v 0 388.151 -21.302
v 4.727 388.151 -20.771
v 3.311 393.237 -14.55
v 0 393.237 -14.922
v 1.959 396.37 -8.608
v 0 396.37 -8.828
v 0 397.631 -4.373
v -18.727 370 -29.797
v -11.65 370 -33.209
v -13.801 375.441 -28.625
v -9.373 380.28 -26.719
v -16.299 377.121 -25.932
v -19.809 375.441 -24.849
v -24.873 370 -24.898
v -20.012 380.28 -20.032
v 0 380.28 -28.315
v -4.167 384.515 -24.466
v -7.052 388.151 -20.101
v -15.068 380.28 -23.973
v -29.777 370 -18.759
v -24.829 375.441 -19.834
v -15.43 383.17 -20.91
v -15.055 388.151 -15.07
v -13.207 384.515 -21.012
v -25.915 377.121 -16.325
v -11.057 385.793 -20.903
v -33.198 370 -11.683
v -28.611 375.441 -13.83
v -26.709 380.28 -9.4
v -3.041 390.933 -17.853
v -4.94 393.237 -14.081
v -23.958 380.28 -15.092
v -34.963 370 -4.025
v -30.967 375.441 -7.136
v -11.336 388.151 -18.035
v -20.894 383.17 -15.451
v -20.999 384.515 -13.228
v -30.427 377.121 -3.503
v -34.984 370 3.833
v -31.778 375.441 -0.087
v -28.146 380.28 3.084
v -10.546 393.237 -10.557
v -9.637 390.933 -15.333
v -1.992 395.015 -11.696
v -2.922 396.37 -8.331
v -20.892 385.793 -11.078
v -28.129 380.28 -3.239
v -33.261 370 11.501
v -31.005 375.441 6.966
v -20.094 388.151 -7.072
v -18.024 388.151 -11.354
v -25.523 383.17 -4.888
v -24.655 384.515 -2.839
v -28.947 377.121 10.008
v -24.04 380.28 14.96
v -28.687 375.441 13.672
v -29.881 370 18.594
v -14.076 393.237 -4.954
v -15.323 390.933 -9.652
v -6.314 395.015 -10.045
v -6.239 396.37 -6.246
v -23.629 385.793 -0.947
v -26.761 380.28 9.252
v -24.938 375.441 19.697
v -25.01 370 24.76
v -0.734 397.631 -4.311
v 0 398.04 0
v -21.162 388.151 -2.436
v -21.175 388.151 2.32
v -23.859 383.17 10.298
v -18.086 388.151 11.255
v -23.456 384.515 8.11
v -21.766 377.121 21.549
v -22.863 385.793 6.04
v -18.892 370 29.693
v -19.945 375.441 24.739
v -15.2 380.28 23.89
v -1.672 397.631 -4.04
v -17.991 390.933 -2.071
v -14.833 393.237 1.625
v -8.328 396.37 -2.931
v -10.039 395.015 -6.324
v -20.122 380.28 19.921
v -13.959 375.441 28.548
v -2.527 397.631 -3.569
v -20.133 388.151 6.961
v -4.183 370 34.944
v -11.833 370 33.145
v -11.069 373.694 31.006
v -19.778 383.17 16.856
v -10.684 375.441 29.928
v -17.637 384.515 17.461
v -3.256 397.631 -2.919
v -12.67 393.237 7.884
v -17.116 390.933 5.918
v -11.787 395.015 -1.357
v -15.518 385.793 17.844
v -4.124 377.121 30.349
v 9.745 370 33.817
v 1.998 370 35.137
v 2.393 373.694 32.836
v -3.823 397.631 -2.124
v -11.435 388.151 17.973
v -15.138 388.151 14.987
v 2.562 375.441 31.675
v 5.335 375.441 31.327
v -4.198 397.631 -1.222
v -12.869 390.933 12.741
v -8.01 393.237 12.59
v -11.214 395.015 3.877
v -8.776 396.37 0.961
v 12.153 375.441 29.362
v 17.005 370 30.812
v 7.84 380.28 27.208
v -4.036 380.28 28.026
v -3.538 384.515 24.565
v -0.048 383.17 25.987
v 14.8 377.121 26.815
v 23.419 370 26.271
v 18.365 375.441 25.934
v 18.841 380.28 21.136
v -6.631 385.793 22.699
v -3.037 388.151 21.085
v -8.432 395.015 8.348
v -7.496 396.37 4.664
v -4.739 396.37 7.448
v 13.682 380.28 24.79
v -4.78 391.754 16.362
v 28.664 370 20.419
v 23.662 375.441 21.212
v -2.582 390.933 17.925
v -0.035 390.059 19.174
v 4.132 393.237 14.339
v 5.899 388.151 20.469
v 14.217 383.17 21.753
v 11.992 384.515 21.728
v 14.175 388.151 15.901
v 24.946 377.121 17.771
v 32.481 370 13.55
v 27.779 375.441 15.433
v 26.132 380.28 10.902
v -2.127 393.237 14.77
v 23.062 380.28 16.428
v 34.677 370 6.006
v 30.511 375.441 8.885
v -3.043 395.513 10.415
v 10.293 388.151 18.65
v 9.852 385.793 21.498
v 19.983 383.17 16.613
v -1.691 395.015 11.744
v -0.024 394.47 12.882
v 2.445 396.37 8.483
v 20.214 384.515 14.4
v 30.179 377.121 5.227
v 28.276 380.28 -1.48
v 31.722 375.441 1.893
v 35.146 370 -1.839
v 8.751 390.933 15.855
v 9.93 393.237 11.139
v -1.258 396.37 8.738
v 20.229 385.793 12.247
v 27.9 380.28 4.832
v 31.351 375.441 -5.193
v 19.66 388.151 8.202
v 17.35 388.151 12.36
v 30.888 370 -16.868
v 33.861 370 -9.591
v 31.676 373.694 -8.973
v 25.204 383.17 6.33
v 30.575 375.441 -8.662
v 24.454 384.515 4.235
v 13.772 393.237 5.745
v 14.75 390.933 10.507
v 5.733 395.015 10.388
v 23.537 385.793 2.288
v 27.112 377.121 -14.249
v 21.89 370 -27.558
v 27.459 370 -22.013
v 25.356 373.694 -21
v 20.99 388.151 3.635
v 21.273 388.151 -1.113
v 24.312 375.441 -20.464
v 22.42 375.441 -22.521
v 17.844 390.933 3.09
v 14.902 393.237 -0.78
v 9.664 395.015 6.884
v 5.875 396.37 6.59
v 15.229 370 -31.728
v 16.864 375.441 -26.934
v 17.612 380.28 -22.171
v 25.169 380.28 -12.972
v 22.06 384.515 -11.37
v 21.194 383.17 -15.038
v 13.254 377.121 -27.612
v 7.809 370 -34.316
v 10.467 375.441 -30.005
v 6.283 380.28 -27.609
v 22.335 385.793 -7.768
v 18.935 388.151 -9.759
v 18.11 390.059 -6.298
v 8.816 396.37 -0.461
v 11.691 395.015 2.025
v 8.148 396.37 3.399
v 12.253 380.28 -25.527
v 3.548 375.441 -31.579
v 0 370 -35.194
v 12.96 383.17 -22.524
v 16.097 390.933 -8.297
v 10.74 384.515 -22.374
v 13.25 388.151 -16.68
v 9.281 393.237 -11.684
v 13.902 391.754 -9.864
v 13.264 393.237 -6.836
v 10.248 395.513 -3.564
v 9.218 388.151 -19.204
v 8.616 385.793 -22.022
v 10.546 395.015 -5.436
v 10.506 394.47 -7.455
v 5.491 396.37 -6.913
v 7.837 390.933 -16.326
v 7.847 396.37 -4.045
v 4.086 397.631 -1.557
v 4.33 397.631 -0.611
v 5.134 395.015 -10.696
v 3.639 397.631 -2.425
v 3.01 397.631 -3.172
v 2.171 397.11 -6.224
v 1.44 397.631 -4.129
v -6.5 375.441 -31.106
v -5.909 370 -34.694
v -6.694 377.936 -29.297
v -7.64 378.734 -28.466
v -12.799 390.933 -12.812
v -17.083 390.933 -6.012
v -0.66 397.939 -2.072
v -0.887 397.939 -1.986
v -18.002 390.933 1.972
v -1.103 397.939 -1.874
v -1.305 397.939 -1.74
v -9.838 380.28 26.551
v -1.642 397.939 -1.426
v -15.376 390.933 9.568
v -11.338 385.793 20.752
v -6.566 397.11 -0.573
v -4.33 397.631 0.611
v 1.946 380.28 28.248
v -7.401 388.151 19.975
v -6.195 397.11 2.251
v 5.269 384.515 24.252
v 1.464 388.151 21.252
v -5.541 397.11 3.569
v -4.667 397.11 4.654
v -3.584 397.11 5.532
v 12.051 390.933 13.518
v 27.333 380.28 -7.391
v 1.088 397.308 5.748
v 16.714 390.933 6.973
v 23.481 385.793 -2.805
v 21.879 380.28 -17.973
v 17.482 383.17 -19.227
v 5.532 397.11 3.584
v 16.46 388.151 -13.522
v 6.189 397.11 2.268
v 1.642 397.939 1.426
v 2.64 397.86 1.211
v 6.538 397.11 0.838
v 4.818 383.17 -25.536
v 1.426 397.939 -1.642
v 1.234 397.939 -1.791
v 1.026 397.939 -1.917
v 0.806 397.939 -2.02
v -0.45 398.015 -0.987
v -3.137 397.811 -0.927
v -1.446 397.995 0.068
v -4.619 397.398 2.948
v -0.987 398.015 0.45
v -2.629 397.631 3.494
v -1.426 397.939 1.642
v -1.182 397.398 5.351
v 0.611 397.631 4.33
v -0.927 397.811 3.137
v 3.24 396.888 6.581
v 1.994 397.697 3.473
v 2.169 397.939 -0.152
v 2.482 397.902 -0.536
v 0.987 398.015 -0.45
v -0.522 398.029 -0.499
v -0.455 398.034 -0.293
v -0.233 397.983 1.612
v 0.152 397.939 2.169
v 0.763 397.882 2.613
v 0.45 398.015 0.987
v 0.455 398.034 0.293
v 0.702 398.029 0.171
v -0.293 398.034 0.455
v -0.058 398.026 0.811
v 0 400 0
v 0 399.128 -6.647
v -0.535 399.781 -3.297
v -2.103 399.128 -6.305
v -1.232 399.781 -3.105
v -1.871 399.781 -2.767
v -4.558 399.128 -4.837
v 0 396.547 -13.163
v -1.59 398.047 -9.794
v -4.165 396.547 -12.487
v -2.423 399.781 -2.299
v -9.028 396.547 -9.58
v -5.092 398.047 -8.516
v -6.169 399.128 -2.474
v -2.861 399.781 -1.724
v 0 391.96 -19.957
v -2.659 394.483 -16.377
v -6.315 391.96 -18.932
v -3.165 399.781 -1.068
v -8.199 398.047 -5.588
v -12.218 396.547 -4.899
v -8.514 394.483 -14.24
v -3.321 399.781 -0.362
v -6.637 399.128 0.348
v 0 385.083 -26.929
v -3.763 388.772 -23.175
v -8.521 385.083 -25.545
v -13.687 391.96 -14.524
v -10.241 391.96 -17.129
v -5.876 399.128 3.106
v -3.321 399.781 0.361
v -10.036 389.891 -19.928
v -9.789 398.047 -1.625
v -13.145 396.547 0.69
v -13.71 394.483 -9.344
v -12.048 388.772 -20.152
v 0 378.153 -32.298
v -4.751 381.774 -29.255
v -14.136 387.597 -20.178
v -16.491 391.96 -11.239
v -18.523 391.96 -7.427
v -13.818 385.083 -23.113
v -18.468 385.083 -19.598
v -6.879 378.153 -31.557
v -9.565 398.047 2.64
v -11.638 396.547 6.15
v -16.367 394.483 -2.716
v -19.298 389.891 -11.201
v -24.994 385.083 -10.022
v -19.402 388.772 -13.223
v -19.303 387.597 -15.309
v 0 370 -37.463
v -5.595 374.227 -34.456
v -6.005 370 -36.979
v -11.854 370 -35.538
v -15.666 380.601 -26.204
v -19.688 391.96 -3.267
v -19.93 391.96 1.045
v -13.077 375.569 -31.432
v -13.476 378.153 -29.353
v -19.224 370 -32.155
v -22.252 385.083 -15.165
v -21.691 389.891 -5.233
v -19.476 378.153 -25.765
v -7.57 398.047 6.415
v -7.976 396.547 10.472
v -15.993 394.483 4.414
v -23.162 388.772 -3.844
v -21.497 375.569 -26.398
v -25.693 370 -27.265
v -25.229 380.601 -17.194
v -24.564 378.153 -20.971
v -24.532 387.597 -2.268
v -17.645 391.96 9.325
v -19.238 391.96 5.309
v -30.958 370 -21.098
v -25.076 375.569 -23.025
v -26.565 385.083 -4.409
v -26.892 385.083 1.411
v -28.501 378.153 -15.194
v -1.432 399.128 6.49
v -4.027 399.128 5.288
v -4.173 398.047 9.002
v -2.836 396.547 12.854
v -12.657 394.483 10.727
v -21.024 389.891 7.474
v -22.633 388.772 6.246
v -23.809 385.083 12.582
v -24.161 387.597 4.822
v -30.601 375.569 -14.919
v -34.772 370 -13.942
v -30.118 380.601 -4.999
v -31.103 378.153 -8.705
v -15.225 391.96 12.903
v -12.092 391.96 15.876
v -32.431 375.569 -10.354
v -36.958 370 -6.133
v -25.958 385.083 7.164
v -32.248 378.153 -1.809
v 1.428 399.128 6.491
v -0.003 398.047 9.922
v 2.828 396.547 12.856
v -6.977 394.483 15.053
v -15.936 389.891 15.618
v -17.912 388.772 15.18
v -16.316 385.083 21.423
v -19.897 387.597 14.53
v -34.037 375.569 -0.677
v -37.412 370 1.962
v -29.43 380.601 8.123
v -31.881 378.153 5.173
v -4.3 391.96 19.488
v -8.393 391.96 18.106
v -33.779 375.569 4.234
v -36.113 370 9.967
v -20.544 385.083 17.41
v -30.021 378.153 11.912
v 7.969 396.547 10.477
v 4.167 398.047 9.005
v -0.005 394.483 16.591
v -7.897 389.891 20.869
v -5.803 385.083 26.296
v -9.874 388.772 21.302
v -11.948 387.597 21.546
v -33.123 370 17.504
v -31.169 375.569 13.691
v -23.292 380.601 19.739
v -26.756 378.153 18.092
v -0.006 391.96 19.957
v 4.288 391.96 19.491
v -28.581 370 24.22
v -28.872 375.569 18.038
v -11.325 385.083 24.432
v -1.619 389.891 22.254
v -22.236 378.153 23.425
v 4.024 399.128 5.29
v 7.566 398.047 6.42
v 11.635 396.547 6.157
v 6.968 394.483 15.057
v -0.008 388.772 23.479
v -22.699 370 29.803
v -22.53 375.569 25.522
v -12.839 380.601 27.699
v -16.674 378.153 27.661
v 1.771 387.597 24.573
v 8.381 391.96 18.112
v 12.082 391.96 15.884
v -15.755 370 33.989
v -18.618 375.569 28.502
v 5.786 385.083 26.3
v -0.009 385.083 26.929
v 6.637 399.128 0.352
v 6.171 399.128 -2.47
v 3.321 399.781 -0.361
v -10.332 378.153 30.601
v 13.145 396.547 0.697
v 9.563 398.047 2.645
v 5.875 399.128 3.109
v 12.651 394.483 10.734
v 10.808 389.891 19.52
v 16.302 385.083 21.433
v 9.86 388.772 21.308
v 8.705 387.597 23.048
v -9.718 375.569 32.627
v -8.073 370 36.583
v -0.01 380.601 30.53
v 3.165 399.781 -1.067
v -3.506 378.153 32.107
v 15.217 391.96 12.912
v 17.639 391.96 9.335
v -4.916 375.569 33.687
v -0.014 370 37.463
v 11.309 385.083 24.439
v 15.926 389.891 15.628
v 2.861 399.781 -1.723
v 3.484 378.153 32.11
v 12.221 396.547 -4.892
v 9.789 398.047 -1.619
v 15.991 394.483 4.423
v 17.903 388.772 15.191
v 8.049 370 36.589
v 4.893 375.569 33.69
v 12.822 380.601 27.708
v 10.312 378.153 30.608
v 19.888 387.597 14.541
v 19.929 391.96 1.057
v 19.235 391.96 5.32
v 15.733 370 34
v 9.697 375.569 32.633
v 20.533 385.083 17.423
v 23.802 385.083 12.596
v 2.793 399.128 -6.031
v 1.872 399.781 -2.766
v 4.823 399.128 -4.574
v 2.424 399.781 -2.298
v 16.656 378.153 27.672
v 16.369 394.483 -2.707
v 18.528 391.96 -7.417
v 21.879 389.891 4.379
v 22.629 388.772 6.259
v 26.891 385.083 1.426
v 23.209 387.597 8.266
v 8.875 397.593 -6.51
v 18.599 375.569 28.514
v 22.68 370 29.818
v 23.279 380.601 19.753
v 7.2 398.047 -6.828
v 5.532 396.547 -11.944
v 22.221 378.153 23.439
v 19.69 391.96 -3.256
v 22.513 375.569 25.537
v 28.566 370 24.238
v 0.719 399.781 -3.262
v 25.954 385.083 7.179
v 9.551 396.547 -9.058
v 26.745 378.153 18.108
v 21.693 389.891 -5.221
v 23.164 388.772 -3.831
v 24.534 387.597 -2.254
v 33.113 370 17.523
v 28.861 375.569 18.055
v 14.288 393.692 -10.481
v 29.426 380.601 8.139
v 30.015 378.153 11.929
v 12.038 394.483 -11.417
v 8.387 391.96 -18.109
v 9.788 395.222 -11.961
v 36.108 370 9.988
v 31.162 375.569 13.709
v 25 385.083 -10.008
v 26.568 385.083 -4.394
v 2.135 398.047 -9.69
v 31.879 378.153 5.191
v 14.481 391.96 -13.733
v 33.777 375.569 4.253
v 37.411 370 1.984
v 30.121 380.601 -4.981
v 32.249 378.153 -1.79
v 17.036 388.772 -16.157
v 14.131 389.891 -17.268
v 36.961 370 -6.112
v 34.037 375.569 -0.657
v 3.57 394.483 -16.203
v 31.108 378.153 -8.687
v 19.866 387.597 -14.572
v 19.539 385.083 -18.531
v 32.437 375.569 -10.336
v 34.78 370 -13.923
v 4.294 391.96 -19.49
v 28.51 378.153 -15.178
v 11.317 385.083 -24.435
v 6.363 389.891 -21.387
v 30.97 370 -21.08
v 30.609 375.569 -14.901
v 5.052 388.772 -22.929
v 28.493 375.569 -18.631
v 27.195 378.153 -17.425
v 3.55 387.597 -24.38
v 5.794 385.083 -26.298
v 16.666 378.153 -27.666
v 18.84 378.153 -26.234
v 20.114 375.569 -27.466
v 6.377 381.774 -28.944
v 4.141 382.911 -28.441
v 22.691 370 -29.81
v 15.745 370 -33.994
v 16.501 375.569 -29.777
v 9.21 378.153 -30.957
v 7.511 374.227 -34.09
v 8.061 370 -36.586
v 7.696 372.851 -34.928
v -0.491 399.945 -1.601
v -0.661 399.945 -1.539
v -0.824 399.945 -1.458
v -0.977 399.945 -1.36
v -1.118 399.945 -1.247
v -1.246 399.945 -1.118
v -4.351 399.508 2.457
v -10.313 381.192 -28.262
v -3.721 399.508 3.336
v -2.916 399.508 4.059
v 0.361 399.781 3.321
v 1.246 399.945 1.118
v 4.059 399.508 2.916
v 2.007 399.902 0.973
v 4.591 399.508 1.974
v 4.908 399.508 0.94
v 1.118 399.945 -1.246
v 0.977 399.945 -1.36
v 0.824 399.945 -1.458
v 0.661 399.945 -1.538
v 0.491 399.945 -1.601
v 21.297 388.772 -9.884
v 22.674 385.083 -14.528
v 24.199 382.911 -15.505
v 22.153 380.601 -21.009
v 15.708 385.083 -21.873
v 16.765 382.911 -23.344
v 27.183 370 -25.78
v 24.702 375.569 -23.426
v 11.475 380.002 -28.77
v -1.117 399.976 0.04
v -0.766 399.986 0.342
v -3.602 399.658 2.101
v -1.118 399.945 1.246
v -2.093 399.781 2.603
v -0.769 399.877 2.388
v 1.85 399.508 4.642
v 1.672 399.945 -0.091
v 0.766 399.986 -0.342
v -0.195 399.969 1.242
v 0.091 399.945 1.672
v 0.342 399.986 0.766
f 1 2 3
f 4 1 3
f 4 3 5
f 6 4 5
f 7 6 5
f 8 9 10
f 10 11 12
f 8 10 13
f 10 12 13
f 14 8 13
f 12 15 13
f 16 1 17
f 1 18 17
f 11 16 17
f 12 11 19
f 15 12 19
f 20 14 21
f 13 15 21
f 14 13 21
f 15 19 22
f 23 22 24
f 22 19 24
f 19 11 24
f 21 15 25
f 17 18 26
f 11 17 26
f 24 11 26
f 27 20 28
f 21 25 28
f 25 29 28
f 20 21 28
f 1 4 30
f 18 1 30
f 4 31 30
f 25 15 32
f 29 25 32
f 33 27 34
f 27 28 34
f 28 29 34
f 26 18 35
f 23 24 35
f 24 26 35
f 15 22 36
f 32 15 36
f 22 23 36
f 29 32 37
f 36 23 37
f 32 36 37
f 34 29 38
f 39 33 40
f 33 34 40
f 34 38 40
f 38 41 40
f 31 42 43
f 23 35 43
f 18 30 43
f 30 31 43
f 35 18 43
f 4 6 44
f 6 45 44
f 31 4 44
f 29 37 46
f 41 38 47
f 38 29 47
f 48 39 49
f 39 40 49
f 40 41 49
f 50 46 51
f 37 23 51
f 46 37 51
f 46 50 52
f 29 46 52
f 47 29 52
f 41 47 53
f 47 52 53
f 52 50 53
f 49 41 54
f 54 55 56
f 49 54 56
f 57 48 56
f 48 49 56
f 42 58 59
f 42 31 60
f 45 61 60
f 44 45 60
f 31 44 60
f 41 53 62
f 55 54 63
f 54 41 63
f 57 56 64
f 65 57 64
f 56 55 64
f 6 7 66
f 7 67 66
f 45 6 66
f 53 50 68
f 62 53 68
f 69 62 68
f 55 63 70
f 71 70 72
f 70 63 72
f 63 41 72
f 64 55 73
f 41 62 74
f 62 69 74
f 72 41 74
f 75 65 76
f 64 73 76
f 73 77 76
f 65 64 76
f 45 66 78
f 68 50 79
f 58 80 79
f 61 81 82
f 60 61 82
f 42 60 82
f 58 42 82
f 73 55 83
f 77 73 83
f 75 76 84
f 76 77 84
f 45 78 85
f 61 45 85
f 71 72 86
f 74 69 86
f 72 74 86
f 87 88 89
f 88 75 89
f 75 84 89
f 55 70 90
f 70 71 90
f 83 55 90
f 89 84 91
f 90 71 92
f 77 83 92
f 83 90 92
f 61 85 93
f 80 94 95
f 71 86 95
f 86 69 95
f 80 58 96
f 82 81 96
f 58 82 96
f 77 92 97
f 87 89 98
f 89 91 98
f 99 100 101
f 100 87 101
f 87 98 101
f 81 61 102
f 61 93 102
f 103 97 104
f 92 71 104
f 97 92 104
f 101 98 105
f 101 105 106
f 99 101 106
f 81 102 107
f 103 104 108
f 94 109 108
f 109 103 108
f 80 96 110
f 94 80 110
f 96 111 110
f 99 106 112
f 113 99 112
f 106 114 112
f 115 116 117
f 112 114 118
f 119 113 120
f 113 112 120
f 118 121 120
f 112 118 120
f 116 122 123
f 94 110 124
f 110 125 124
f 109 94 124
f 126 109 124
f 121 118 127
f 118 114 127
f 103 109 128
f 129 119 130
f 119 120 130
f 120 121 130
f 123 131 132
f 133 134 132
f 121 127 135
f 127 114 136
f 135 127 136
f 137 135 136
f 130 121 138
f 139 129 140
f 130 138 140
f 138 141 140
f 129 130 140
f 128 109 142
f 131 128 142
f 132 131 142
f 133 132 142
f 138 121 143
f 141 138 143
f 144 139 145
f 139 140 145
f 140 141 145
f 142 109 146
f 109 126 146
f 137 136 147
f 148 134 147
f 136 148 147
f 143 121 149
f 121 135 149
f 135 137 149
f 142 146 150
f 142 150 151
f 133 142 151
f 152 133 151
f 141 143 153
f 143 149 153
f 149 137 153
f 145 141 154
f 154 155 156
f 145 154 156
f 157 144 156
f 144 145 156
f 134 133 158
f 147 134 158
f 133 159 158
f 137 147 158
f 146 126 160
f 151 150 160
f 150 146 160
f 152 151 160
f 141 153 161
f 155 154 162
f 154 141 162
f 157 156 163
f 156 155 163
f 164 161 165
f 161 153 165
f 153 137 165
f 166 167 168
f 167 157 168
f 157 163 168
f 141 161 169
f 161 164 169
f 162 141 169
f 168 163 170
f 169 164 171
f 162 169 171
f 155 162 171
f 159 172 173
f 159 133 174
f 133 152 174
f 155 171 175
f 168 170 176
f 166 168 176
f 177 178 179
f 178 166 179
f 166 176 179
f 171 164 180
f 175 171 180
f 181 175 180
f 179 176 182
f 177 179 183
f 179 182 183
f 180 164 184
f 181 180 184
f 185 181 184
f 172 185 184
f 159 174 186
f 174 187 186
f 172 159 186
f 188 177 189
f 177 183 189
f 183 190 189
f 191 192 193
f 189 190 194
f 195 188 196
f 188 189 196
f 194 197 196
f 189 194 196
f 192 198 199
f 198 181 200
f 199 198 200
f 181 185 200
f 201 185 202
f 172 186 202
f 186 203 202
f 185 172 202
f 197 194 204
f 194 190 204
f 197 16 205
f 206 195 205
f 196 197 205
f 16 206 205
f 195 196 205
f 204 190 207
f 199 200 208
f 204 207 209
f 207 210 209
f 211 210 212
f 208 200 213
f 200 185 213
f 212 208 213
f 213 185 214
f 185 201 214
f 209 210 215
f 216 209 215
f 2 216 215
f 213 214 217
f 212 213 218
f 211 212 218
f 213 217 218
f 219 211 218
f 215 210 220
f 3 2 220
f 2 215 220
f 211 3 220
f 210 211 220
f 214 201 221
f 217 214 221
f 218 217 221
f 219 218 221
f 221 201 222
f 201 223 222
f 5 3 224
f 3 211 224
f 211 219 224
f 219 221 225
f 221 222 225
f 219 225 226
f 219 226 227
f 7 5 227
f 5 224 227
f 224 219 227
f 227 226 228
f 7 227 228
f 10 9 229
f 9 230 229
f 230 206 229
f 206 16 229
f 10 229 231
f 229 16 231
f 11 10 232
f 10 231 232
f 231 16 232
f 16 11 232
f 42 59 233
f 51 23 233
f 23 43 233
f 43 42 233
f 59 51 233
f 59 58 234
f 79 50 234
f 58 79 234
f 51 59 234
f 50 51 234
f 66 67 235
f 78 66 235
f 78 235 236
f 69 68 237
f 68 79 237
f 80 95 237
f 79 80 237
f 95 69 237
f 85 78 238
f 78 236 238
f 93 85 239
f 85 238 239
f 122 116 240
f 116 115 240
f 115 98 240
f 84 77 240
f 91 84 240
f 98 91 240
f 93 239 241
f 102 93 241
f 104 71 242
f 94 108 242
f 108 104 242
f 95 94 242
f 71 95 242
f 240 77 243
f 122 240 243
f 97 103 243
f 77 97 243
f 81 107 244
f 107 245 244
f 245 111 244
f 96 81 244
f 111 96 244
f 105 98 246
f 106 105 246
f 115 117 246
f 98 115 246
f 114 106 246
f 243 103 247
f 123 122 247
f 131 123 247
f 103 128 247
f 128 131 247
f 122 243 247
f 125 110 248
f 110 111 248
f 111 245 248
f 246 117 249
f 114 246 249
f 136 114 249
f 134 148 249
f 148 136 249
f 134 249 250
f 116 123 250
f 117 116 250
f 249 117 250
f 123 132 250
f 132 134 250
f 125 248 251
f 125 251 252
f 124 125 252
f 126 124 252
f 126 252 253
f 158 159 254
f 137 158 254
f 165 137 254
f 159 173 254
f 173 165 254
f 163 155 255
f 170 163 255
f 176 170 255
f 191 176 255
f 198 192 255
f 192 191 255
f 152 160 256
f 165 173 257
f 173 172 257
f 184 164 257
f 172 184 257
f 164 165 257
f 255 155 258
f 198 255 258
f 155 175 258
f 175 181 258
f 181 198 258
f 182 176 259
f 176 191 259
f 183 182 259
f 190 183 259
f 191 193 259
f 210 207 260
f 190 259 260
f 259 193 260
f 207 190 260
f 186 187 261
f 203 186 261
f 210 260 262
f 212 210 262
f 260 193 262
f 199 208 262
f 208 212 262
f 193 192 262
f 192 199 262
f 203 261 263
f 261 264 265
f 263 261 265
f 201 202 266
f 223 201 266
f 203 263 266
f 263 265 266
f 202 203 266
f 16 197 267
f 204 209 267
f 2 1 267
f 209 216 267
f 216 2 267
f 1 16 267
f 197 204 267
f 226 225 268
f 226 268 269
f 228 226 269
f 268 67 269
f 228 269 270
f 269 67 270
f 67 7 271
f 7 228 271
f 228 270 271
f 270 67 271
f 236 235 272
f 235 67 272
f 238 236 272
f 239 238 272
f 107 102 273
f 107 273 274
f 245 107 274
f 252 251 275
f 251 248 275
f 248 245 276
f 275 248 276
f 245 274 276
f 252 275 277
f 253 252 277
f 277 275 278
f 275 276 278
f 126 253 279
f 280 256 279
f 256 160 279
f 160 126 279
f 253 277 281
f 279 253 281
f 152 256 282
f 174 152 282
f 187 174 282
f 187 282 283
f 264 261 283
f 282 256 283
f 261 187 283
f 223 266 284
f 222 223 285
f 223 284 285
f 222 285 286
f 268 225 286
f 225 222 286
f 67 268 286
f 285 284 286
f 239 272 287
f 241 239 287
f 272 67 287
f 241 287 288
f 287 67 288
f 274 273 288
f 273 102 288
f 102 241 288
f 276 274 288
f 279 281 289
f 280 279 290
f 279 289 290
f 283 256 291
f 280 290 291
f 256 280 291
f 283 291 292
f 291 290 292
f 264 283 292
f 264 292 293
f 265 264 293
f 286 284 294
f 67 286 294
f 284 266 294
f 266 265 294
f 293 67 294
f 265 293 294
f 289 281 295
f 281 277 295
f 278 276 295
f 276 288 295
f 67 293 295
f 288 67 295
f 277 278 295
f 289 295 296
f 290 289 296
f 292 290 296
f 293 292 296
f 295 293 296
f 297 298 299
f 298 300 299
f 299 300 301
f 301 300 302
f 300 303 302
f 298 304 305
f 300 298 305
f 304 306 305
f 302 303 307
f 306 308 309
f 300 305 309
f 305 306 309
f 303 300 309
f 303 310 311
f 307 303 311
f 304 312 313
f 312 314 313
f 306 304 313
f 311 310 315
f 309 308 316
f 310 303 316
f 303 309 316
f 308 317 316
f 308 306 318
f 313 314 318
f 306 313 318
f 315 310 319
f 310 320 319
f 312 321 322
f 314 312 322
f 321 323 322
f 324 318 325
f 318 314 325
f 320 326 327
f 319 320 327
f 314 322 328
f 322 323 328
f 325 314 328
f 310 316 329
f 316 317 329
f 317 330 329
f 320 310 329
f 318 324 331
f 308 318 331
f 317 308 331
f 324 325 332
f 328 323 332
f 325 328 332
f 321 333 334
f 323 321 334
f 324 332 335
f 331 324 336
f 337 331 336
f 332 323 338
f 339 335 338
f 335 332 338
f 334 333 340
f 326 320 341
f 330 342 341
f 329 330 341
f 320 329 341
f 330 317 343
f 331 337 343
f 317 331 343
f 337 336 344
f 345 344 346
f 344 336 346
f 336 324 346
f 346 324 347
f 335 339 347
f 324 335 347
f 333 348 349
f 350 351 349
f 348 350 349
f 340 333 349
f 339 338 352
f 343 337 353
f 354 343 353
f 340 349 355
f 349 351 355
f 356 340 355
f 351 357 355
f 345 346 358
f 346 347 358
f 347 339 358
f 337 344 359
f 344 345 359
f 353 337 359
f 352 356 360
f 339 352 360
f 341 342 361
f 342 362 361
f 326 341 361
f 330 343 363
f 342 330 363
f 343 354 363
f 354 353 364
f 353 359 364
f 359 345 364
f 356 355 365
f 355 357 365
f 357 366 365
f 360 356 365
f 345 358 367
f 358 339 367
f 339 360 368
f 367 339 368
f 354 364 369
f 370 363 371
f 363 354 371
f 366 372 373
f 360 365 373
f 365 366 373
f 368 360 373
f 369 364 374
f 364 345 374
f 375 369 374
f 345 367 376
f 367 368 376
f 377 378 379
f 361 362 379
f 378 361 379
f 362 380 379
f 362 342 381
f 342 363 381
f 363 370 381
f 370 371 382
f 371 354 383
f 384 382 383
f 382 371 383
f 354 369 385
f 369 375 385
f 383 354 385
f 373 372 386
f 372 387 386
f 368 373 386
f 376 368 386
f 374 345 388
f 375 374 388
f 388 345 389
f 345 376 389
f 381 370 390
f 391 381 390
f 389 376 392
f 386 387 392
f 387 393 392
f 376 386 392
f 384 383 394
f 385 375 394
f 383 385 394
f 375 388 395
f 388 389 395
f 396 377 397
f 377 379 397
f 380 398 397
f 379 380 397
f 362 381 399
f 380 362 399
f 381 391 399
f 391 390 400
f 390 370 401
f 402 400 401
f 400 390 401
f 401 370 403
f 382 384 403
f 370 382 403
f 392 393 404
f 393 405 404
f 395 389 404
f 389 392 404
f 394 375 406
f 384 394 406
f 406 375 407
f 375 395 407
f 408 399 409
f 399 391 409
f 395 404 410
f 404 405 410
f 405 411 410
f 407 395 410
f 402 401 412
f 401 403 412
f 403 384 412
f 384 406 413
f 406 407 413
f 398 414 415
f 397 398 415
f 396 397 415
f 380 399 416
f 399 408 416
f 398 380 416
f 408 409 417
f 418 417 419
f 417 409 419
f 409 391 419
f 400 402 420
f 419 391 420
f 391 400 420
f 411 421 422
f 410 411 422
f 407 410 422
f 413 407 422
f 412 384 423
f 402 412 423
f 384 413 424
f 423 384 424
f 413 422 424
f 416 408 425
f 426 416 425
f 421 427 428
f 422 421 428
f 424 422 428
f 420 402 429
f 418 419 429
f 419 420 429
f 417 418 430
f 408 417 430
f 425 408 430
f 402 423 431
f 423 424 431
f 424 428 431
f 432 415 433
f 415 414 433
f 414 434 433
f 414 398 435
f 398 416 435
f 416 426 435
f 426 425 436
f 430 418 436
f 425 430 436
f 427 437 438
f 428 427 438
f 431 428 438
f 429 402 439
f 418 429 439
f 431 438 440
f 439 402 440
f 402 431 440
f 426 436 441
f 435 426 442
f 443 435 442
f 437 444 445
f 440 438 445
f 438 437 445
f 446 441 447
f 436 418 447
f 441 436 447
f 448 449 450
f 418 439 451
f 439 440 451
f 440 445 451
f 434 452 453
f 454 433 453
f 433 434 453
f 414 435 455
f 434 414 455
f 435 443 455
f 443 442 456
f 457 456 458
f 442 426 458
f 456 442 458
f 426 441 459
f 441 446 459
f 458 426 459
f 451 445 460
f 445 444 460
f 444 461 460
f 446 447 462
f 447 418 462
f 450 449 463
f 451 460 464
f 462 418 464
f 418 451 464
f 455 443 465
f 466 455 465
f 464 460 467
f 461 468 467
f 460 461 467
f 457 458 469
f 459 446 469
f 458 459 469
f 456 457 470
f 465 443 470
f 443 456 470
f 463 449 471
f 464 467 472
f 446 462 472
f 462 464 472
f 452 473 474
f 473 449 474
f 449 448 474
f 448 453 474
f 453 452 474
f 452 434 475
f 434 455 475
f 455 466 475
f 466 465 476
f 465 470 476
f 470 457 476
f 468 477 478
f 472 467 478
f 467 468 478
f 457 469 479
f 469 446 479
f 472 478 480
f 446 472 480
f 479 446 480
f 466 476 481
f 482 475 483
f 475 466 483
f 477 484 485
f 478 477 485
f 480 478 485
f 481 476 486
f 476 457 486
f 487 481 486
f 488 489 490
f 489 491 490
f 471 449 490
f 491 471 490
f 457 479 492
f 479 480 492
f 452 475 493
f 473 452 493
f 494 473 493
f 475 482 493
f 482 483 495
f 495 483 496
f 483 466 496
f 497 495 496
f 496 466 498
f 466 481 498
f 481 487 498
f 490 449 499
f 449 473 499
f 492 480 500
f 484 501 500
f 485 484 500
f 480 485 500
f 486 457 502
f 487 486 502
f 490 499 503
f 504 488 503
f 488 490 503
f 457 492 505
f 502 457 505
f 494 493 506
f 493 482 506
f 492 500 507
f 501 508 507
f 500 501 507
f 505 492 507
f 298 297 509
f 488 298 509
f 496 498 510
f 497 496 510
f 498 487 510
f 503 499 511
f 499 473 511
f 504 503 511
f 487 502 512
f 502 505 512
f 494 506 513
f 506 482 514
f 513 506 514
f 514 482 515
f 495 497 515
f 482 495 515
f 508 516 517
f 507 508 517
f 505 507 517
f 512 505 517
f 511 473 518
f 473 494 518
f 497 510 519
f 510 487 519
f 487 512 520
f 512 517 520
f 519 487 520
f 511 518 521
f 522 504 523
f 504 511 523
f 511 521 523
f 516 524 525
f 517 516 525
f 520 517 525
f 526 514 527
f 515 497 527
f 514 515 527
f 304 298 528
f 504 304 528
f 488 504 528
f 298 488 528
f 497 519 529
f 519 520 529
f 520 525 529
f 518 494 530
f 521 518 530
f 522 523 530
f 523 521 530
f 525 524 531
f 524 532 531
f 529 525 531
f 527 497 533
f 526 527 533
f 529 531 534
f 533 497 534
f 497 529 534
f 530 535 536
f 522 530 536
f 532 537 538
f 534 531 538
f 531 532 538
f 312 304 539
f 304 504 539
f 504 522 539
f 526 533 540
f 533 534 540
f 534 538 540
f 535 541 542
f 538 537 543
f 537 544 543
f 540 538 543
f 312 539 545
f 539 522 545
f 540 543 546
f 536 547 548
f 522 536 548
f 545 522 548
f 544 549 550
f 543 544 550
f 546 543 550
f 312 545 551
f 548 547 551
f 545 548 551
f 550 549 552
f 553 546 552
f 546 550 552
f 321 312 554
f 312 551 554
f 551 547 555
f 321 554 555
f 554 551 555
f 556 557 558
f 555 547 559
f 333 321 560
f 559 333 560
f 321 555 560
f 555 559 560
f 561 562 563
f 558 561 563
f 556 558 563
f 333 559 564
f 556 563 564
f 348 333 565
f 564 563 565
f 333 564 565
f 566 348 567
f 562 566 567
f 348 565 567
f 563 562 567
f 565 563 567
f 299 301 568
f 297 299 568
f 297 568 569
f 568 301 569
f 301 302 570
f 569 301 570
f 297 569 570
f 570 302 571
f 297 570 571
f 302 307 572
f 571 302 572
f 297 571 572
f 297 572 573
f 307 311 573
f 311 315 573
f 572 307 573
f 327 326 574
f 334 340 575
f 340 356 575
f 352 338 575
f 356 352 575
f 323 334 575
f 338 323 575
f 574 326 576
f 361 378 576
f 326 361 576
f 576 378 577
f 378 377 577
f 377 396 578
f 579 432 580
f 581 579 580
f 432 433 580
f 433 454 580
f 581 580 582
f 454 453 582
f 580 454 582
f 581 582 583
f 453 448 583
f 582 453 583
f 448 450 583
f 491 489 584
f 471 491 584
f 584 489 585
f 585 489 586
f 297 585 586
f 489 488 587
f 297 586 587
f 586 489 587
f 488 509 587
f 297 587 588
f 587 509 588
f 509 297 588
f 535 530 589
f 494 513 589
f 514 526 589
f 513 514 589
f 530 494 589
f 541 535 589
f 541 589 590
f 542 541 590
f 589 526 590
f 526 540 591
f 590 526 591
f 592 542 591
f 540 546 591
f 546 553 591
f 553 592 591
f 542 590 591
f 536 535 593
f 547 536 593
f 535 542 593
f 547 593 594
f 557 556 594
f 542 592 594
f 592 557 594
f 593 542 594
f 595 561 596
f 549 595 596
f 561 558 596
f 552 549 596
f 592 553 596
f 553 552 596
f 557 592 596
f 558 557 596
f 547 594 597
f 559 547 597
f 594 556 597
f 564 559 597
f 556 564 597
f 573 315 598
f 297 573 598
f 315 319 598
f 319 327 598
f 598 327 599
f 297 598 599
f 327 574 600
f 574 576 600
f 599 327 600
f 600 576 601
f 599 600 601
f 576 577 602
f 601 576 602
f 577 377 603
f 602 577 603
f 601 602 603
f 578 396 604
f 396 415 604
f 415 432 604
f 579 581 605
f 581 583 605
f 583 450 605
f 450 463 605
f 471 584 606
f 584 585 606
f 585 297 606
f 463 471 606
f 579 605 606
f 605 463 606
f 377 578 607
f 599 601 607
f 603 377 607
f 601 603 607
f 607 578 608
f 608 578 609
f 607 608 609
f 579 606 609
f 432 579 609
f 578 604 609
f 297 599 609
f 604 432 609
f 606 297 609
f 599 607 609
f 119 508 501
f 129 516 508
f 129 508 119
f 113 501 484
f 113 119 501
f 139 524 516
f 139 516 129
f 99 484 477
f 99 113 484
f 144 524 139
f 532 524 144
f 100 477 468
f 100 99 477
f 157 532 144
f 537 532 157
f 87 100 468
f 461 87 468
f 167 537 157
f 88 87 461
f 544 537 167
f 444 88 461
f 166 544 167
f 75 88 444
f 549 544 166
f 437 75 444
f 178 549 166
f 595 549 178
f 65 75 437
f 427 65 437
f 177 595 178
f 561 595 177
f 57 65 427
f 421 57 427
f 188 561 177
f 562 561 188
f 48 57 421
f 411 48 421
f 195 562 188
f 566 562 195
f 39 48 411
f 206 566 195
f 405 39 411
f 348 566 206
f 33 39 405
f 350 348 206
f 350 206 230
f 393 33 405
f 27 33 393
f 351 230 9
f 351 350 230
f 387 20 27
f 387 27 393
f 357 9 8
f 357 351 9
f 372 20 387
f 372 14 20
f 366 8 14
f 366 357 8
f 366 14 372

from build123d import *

# Parameters (mm, degrees)
BOSS_EXTRUDE1_START = -304.8
SKETCH2_R           = 76.2
SKETCH2_R_2         = 74.2
BOSS_EXTRUDE1_DEPTH = 304.8
SKETCH3_R           = 134.747251172
CUT_EXTRUDE1_DEPTH  = 537.314284008


with BuildPart() as part:
    # Sketch1 → Revolve1 (revolve)
    with BuildSketch(Plane.XY, mode=Mode.PRIVATE) as revolve1_sk:
        with BuildLine():
            Line((76.2, 150), (76.2, 0))
            Line((76.2, 0), (78.16, 0))
            Line((78.16, 0), (78.16, 150))
            add(Edge.make_bspline(
                [(0, 400), (2.723149784, 400), (8.095363208, 399.131102803), (15.985209364, 395.313409978), (23.550682528, 389.130576689), (33.207143777, 377.875372886), (44.403572502, 358.368758892), (56.109342912, 327.087146412), (65.689764926, 289.080732548), (71.61438571, 252.993821619), (74.98797824, 222.299614595), (76.812690029, 198.58573428), (77.914396428, 174.415956203), (78.16, 158.124741441), (78.16, 150)],
                knots=[-1.570796327, -1.570796327, -1.570796327, -1.570796327, -1.472621556, -1.374446786, -1.276272016, -1.178097245, -0.981747704, -0.785398163, -0.589048623, -0.392699082, -0.294524311, -0.196349541, -0.09817477, 0, 0, 0, 0], degree=3))
            Line((0, 400), (0, 398.04))
            add(Edge.make_bspline(
                [(76.2, 150), (76.2, 398.04), (0, 398.04)],
                knots=[4.71238898, 4.71238898, 4.71238898, 6.283185307, 6.283185307, 6.283185307], degree=2, weights=[1, 0.707106781, 1]))
        make_face()
    revolve(revolve1_sk.sketch.rotate(Axis((0, 0, 0), (0, 1, 0)), 90), axis=Axis((0, 0, 0), (0, 1, 0)))

    # Sketch2 → Boss-Extrude1 (add)
    with BuildSketch(Plane(origin=(0, 150, 0), x_dir=(1, 0, 0), z_dir=(0, 1, 0)).offset(BOSS_EXTRUDE1_START)):
        with Locations(Location((0, 0, 0), (0, 0, 270))):
            Circle(SKETCH2_R)
        with Locations(Location((0, 0, 0), (0, 0, 270))):
            Circle(SKETCH2_R_2, mode=Mode.SUBTRACT)
    extrude(amount=BOSS_EXTRUDE1_DEPTH)

    # Sketch3 → Cut-Extrude1 (cut, through all)
    with BuildSketch(Plane(origin=(0, 370, 0), x_dir=(-1, 0, 0), z_dir=(0, -1, 0))):
        Circle(SKETCH3_R)
    extrude(amount=CUT_EXTRUDE1_DEPTH, mode=Mode.SUBTRACT)


solid = part.part
